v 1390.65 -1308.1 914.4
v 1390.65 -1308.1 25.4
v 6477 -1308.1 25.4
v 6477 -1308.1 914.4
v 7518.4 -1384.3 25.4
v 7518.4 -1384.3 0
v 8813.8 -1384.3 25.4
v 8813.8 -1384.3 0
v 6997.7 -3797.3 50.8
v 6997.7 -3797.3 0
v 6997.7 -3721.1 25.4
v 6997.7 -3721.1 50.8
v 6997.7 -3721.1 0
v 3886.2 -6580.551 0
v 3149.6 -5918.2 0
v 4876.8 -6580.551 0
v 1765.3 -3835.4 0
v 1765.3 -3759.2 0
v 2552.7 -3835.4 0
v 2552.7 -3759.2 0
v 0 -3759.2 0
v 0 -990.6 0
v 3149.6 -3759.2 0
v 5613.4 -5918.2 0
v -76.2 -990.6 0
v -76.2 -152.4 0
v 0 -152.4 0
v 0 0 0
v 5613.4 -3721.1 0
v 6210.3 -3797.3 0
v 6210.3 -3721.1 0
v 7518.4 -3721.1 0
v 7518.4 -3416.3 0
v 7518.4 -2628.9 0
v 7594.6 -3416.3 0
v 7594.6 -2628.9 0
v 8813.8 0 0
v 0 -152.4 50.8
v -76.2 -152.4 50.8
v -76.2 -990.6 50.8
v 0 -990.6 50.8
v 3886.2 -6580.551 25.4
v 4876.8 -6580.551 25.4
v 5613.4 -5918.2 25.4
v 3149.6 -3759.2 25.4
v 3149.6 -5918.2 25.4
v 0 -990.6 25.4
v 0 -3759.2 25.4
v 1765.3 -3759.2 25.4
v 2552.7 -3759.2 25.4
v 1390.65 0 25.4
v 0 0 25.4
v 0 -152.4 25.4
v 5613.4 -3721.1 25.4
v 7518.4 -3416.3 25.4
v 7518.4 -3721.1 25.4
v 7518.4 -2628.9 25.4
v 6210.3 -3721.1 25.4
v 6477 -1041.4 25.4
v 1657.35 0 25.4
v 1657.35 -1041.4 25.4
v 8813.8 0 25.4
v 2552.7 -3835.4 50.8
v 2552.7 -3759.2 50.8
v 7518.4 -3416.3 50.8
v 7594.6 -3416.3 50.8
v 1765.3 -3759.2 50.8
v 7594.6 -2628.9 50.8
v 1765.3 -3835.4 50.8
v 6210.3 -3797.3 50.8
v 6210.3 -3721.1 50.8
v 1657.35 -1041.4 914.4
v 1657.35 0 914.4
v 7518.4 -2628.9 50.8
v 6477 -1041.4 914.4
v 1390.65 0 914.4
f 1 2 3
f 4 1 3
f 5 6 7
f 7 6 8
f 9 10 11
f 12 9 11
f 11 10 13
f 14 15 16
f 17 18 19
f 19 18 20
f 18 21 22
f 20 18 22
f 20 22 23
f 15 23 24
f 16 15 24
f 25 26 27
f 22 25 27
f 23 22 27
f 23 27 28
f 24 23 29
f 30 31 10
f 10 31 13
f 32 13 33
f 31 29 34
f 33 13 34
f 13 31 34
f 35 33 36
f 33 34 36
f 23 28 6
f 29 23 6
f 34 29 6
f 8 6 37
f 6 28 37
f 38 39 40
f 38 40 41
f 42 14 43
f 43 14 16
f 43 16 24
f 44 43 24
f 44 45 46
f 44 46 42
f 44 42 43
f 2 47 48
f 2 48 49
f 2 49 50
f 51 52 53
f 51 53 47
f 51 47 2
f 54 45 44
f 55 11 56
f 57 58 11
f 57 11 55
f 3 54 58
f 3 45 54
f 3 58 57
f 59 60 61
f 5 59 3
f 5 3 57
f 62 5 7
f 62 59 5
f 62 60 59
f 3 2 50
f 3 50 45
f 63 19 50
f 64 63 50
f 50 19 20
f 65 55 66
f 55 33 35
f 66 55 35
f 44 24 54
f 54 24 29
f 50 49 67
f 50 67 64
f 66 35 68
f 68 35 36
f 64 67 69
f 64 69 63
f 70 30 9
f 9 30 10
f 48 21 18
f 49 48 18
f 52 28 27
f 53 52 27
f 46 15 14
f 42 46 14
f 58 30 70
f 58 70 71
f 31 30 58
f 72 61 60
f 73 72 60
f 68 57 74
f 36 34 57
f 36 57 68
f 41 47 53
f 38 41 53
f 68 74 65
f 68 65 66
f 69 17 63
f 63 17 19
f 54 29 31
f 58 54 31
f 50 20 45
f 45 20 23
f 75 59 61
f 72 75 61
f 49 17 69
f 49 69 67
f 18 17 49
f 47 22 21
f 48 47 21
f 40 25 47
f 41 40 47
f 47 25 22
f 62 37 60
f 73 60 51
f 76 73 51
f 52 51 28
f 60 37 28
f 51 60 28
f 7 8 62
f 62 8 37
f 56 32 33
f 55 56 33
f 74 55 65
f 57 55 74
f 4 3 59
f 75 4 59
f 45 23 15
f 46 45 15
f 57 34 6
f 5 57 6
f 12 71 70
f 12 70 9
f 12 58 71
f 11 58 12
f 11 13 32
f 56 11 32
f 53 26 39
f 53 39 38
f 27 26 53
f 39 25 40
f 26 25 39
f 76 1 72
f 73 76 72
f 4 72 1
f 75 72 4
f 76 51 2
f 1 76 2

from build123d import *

# Parameters (mm, degrees)
F3_DEPTH = 25.4
F4_DEPTH = 914.4
F2_W     = 76.2
F2_H     = 838.2
F2_W_2   = 787.4
F2_H_2   = 76.2
F2_H_3   = 787.4
F5_DEPTH = 50.8


with BuildPart() as f3:
    # F0 (on Top) → F3 (new body)
    with BuildSketch(Plane.XY):
        Polygon((8813.8, 0), (0, 0), (0, -3759.2), (3149.6, -3759.2), (3149.6, -5918.2), (3886.2, -6580.550964), (4876.8, -6580.550964), (5613.4, -5918.2), (5613.4, -3721.1), (7518.4, -3721.1), (7518.4, -1384.3), (8813.8, -1384.3), align=None)
    extrude(amount=F3_DEPTH)

    # F1 (on Top) → F4 (join)
    with BuildSketch(Plane.XY):
        Polygon((6477, -1308.1), (6477, -1174.75), (6477, -1041.4), (1657.35, -1041.4), (1657.35, 0), (1524, 0), (1390.65, 0), (1390.65, -1308.1), align=None)
    extrude(amount=F4_DEPTH)

    # F2 (on Top) → F5 (join)
    with BuildSketch(Plane.XY):
        with Locations((-38.1, -571.5)):
            Rectangle(F2_W, F2_H)
        with Locations((2159, -3797.3)):
            Rectangle(F2_W_2, F2_H_2)
        with Locations((6604, -3759.2)):
            Rectangle(F2_W_2, F2_H_2)
        with Locations((7556.5, -3022.6)):
            Rectangle(F2_W, F2_H_3)
    extrude(amount=F5_DEPTH)


solid = f3.part
